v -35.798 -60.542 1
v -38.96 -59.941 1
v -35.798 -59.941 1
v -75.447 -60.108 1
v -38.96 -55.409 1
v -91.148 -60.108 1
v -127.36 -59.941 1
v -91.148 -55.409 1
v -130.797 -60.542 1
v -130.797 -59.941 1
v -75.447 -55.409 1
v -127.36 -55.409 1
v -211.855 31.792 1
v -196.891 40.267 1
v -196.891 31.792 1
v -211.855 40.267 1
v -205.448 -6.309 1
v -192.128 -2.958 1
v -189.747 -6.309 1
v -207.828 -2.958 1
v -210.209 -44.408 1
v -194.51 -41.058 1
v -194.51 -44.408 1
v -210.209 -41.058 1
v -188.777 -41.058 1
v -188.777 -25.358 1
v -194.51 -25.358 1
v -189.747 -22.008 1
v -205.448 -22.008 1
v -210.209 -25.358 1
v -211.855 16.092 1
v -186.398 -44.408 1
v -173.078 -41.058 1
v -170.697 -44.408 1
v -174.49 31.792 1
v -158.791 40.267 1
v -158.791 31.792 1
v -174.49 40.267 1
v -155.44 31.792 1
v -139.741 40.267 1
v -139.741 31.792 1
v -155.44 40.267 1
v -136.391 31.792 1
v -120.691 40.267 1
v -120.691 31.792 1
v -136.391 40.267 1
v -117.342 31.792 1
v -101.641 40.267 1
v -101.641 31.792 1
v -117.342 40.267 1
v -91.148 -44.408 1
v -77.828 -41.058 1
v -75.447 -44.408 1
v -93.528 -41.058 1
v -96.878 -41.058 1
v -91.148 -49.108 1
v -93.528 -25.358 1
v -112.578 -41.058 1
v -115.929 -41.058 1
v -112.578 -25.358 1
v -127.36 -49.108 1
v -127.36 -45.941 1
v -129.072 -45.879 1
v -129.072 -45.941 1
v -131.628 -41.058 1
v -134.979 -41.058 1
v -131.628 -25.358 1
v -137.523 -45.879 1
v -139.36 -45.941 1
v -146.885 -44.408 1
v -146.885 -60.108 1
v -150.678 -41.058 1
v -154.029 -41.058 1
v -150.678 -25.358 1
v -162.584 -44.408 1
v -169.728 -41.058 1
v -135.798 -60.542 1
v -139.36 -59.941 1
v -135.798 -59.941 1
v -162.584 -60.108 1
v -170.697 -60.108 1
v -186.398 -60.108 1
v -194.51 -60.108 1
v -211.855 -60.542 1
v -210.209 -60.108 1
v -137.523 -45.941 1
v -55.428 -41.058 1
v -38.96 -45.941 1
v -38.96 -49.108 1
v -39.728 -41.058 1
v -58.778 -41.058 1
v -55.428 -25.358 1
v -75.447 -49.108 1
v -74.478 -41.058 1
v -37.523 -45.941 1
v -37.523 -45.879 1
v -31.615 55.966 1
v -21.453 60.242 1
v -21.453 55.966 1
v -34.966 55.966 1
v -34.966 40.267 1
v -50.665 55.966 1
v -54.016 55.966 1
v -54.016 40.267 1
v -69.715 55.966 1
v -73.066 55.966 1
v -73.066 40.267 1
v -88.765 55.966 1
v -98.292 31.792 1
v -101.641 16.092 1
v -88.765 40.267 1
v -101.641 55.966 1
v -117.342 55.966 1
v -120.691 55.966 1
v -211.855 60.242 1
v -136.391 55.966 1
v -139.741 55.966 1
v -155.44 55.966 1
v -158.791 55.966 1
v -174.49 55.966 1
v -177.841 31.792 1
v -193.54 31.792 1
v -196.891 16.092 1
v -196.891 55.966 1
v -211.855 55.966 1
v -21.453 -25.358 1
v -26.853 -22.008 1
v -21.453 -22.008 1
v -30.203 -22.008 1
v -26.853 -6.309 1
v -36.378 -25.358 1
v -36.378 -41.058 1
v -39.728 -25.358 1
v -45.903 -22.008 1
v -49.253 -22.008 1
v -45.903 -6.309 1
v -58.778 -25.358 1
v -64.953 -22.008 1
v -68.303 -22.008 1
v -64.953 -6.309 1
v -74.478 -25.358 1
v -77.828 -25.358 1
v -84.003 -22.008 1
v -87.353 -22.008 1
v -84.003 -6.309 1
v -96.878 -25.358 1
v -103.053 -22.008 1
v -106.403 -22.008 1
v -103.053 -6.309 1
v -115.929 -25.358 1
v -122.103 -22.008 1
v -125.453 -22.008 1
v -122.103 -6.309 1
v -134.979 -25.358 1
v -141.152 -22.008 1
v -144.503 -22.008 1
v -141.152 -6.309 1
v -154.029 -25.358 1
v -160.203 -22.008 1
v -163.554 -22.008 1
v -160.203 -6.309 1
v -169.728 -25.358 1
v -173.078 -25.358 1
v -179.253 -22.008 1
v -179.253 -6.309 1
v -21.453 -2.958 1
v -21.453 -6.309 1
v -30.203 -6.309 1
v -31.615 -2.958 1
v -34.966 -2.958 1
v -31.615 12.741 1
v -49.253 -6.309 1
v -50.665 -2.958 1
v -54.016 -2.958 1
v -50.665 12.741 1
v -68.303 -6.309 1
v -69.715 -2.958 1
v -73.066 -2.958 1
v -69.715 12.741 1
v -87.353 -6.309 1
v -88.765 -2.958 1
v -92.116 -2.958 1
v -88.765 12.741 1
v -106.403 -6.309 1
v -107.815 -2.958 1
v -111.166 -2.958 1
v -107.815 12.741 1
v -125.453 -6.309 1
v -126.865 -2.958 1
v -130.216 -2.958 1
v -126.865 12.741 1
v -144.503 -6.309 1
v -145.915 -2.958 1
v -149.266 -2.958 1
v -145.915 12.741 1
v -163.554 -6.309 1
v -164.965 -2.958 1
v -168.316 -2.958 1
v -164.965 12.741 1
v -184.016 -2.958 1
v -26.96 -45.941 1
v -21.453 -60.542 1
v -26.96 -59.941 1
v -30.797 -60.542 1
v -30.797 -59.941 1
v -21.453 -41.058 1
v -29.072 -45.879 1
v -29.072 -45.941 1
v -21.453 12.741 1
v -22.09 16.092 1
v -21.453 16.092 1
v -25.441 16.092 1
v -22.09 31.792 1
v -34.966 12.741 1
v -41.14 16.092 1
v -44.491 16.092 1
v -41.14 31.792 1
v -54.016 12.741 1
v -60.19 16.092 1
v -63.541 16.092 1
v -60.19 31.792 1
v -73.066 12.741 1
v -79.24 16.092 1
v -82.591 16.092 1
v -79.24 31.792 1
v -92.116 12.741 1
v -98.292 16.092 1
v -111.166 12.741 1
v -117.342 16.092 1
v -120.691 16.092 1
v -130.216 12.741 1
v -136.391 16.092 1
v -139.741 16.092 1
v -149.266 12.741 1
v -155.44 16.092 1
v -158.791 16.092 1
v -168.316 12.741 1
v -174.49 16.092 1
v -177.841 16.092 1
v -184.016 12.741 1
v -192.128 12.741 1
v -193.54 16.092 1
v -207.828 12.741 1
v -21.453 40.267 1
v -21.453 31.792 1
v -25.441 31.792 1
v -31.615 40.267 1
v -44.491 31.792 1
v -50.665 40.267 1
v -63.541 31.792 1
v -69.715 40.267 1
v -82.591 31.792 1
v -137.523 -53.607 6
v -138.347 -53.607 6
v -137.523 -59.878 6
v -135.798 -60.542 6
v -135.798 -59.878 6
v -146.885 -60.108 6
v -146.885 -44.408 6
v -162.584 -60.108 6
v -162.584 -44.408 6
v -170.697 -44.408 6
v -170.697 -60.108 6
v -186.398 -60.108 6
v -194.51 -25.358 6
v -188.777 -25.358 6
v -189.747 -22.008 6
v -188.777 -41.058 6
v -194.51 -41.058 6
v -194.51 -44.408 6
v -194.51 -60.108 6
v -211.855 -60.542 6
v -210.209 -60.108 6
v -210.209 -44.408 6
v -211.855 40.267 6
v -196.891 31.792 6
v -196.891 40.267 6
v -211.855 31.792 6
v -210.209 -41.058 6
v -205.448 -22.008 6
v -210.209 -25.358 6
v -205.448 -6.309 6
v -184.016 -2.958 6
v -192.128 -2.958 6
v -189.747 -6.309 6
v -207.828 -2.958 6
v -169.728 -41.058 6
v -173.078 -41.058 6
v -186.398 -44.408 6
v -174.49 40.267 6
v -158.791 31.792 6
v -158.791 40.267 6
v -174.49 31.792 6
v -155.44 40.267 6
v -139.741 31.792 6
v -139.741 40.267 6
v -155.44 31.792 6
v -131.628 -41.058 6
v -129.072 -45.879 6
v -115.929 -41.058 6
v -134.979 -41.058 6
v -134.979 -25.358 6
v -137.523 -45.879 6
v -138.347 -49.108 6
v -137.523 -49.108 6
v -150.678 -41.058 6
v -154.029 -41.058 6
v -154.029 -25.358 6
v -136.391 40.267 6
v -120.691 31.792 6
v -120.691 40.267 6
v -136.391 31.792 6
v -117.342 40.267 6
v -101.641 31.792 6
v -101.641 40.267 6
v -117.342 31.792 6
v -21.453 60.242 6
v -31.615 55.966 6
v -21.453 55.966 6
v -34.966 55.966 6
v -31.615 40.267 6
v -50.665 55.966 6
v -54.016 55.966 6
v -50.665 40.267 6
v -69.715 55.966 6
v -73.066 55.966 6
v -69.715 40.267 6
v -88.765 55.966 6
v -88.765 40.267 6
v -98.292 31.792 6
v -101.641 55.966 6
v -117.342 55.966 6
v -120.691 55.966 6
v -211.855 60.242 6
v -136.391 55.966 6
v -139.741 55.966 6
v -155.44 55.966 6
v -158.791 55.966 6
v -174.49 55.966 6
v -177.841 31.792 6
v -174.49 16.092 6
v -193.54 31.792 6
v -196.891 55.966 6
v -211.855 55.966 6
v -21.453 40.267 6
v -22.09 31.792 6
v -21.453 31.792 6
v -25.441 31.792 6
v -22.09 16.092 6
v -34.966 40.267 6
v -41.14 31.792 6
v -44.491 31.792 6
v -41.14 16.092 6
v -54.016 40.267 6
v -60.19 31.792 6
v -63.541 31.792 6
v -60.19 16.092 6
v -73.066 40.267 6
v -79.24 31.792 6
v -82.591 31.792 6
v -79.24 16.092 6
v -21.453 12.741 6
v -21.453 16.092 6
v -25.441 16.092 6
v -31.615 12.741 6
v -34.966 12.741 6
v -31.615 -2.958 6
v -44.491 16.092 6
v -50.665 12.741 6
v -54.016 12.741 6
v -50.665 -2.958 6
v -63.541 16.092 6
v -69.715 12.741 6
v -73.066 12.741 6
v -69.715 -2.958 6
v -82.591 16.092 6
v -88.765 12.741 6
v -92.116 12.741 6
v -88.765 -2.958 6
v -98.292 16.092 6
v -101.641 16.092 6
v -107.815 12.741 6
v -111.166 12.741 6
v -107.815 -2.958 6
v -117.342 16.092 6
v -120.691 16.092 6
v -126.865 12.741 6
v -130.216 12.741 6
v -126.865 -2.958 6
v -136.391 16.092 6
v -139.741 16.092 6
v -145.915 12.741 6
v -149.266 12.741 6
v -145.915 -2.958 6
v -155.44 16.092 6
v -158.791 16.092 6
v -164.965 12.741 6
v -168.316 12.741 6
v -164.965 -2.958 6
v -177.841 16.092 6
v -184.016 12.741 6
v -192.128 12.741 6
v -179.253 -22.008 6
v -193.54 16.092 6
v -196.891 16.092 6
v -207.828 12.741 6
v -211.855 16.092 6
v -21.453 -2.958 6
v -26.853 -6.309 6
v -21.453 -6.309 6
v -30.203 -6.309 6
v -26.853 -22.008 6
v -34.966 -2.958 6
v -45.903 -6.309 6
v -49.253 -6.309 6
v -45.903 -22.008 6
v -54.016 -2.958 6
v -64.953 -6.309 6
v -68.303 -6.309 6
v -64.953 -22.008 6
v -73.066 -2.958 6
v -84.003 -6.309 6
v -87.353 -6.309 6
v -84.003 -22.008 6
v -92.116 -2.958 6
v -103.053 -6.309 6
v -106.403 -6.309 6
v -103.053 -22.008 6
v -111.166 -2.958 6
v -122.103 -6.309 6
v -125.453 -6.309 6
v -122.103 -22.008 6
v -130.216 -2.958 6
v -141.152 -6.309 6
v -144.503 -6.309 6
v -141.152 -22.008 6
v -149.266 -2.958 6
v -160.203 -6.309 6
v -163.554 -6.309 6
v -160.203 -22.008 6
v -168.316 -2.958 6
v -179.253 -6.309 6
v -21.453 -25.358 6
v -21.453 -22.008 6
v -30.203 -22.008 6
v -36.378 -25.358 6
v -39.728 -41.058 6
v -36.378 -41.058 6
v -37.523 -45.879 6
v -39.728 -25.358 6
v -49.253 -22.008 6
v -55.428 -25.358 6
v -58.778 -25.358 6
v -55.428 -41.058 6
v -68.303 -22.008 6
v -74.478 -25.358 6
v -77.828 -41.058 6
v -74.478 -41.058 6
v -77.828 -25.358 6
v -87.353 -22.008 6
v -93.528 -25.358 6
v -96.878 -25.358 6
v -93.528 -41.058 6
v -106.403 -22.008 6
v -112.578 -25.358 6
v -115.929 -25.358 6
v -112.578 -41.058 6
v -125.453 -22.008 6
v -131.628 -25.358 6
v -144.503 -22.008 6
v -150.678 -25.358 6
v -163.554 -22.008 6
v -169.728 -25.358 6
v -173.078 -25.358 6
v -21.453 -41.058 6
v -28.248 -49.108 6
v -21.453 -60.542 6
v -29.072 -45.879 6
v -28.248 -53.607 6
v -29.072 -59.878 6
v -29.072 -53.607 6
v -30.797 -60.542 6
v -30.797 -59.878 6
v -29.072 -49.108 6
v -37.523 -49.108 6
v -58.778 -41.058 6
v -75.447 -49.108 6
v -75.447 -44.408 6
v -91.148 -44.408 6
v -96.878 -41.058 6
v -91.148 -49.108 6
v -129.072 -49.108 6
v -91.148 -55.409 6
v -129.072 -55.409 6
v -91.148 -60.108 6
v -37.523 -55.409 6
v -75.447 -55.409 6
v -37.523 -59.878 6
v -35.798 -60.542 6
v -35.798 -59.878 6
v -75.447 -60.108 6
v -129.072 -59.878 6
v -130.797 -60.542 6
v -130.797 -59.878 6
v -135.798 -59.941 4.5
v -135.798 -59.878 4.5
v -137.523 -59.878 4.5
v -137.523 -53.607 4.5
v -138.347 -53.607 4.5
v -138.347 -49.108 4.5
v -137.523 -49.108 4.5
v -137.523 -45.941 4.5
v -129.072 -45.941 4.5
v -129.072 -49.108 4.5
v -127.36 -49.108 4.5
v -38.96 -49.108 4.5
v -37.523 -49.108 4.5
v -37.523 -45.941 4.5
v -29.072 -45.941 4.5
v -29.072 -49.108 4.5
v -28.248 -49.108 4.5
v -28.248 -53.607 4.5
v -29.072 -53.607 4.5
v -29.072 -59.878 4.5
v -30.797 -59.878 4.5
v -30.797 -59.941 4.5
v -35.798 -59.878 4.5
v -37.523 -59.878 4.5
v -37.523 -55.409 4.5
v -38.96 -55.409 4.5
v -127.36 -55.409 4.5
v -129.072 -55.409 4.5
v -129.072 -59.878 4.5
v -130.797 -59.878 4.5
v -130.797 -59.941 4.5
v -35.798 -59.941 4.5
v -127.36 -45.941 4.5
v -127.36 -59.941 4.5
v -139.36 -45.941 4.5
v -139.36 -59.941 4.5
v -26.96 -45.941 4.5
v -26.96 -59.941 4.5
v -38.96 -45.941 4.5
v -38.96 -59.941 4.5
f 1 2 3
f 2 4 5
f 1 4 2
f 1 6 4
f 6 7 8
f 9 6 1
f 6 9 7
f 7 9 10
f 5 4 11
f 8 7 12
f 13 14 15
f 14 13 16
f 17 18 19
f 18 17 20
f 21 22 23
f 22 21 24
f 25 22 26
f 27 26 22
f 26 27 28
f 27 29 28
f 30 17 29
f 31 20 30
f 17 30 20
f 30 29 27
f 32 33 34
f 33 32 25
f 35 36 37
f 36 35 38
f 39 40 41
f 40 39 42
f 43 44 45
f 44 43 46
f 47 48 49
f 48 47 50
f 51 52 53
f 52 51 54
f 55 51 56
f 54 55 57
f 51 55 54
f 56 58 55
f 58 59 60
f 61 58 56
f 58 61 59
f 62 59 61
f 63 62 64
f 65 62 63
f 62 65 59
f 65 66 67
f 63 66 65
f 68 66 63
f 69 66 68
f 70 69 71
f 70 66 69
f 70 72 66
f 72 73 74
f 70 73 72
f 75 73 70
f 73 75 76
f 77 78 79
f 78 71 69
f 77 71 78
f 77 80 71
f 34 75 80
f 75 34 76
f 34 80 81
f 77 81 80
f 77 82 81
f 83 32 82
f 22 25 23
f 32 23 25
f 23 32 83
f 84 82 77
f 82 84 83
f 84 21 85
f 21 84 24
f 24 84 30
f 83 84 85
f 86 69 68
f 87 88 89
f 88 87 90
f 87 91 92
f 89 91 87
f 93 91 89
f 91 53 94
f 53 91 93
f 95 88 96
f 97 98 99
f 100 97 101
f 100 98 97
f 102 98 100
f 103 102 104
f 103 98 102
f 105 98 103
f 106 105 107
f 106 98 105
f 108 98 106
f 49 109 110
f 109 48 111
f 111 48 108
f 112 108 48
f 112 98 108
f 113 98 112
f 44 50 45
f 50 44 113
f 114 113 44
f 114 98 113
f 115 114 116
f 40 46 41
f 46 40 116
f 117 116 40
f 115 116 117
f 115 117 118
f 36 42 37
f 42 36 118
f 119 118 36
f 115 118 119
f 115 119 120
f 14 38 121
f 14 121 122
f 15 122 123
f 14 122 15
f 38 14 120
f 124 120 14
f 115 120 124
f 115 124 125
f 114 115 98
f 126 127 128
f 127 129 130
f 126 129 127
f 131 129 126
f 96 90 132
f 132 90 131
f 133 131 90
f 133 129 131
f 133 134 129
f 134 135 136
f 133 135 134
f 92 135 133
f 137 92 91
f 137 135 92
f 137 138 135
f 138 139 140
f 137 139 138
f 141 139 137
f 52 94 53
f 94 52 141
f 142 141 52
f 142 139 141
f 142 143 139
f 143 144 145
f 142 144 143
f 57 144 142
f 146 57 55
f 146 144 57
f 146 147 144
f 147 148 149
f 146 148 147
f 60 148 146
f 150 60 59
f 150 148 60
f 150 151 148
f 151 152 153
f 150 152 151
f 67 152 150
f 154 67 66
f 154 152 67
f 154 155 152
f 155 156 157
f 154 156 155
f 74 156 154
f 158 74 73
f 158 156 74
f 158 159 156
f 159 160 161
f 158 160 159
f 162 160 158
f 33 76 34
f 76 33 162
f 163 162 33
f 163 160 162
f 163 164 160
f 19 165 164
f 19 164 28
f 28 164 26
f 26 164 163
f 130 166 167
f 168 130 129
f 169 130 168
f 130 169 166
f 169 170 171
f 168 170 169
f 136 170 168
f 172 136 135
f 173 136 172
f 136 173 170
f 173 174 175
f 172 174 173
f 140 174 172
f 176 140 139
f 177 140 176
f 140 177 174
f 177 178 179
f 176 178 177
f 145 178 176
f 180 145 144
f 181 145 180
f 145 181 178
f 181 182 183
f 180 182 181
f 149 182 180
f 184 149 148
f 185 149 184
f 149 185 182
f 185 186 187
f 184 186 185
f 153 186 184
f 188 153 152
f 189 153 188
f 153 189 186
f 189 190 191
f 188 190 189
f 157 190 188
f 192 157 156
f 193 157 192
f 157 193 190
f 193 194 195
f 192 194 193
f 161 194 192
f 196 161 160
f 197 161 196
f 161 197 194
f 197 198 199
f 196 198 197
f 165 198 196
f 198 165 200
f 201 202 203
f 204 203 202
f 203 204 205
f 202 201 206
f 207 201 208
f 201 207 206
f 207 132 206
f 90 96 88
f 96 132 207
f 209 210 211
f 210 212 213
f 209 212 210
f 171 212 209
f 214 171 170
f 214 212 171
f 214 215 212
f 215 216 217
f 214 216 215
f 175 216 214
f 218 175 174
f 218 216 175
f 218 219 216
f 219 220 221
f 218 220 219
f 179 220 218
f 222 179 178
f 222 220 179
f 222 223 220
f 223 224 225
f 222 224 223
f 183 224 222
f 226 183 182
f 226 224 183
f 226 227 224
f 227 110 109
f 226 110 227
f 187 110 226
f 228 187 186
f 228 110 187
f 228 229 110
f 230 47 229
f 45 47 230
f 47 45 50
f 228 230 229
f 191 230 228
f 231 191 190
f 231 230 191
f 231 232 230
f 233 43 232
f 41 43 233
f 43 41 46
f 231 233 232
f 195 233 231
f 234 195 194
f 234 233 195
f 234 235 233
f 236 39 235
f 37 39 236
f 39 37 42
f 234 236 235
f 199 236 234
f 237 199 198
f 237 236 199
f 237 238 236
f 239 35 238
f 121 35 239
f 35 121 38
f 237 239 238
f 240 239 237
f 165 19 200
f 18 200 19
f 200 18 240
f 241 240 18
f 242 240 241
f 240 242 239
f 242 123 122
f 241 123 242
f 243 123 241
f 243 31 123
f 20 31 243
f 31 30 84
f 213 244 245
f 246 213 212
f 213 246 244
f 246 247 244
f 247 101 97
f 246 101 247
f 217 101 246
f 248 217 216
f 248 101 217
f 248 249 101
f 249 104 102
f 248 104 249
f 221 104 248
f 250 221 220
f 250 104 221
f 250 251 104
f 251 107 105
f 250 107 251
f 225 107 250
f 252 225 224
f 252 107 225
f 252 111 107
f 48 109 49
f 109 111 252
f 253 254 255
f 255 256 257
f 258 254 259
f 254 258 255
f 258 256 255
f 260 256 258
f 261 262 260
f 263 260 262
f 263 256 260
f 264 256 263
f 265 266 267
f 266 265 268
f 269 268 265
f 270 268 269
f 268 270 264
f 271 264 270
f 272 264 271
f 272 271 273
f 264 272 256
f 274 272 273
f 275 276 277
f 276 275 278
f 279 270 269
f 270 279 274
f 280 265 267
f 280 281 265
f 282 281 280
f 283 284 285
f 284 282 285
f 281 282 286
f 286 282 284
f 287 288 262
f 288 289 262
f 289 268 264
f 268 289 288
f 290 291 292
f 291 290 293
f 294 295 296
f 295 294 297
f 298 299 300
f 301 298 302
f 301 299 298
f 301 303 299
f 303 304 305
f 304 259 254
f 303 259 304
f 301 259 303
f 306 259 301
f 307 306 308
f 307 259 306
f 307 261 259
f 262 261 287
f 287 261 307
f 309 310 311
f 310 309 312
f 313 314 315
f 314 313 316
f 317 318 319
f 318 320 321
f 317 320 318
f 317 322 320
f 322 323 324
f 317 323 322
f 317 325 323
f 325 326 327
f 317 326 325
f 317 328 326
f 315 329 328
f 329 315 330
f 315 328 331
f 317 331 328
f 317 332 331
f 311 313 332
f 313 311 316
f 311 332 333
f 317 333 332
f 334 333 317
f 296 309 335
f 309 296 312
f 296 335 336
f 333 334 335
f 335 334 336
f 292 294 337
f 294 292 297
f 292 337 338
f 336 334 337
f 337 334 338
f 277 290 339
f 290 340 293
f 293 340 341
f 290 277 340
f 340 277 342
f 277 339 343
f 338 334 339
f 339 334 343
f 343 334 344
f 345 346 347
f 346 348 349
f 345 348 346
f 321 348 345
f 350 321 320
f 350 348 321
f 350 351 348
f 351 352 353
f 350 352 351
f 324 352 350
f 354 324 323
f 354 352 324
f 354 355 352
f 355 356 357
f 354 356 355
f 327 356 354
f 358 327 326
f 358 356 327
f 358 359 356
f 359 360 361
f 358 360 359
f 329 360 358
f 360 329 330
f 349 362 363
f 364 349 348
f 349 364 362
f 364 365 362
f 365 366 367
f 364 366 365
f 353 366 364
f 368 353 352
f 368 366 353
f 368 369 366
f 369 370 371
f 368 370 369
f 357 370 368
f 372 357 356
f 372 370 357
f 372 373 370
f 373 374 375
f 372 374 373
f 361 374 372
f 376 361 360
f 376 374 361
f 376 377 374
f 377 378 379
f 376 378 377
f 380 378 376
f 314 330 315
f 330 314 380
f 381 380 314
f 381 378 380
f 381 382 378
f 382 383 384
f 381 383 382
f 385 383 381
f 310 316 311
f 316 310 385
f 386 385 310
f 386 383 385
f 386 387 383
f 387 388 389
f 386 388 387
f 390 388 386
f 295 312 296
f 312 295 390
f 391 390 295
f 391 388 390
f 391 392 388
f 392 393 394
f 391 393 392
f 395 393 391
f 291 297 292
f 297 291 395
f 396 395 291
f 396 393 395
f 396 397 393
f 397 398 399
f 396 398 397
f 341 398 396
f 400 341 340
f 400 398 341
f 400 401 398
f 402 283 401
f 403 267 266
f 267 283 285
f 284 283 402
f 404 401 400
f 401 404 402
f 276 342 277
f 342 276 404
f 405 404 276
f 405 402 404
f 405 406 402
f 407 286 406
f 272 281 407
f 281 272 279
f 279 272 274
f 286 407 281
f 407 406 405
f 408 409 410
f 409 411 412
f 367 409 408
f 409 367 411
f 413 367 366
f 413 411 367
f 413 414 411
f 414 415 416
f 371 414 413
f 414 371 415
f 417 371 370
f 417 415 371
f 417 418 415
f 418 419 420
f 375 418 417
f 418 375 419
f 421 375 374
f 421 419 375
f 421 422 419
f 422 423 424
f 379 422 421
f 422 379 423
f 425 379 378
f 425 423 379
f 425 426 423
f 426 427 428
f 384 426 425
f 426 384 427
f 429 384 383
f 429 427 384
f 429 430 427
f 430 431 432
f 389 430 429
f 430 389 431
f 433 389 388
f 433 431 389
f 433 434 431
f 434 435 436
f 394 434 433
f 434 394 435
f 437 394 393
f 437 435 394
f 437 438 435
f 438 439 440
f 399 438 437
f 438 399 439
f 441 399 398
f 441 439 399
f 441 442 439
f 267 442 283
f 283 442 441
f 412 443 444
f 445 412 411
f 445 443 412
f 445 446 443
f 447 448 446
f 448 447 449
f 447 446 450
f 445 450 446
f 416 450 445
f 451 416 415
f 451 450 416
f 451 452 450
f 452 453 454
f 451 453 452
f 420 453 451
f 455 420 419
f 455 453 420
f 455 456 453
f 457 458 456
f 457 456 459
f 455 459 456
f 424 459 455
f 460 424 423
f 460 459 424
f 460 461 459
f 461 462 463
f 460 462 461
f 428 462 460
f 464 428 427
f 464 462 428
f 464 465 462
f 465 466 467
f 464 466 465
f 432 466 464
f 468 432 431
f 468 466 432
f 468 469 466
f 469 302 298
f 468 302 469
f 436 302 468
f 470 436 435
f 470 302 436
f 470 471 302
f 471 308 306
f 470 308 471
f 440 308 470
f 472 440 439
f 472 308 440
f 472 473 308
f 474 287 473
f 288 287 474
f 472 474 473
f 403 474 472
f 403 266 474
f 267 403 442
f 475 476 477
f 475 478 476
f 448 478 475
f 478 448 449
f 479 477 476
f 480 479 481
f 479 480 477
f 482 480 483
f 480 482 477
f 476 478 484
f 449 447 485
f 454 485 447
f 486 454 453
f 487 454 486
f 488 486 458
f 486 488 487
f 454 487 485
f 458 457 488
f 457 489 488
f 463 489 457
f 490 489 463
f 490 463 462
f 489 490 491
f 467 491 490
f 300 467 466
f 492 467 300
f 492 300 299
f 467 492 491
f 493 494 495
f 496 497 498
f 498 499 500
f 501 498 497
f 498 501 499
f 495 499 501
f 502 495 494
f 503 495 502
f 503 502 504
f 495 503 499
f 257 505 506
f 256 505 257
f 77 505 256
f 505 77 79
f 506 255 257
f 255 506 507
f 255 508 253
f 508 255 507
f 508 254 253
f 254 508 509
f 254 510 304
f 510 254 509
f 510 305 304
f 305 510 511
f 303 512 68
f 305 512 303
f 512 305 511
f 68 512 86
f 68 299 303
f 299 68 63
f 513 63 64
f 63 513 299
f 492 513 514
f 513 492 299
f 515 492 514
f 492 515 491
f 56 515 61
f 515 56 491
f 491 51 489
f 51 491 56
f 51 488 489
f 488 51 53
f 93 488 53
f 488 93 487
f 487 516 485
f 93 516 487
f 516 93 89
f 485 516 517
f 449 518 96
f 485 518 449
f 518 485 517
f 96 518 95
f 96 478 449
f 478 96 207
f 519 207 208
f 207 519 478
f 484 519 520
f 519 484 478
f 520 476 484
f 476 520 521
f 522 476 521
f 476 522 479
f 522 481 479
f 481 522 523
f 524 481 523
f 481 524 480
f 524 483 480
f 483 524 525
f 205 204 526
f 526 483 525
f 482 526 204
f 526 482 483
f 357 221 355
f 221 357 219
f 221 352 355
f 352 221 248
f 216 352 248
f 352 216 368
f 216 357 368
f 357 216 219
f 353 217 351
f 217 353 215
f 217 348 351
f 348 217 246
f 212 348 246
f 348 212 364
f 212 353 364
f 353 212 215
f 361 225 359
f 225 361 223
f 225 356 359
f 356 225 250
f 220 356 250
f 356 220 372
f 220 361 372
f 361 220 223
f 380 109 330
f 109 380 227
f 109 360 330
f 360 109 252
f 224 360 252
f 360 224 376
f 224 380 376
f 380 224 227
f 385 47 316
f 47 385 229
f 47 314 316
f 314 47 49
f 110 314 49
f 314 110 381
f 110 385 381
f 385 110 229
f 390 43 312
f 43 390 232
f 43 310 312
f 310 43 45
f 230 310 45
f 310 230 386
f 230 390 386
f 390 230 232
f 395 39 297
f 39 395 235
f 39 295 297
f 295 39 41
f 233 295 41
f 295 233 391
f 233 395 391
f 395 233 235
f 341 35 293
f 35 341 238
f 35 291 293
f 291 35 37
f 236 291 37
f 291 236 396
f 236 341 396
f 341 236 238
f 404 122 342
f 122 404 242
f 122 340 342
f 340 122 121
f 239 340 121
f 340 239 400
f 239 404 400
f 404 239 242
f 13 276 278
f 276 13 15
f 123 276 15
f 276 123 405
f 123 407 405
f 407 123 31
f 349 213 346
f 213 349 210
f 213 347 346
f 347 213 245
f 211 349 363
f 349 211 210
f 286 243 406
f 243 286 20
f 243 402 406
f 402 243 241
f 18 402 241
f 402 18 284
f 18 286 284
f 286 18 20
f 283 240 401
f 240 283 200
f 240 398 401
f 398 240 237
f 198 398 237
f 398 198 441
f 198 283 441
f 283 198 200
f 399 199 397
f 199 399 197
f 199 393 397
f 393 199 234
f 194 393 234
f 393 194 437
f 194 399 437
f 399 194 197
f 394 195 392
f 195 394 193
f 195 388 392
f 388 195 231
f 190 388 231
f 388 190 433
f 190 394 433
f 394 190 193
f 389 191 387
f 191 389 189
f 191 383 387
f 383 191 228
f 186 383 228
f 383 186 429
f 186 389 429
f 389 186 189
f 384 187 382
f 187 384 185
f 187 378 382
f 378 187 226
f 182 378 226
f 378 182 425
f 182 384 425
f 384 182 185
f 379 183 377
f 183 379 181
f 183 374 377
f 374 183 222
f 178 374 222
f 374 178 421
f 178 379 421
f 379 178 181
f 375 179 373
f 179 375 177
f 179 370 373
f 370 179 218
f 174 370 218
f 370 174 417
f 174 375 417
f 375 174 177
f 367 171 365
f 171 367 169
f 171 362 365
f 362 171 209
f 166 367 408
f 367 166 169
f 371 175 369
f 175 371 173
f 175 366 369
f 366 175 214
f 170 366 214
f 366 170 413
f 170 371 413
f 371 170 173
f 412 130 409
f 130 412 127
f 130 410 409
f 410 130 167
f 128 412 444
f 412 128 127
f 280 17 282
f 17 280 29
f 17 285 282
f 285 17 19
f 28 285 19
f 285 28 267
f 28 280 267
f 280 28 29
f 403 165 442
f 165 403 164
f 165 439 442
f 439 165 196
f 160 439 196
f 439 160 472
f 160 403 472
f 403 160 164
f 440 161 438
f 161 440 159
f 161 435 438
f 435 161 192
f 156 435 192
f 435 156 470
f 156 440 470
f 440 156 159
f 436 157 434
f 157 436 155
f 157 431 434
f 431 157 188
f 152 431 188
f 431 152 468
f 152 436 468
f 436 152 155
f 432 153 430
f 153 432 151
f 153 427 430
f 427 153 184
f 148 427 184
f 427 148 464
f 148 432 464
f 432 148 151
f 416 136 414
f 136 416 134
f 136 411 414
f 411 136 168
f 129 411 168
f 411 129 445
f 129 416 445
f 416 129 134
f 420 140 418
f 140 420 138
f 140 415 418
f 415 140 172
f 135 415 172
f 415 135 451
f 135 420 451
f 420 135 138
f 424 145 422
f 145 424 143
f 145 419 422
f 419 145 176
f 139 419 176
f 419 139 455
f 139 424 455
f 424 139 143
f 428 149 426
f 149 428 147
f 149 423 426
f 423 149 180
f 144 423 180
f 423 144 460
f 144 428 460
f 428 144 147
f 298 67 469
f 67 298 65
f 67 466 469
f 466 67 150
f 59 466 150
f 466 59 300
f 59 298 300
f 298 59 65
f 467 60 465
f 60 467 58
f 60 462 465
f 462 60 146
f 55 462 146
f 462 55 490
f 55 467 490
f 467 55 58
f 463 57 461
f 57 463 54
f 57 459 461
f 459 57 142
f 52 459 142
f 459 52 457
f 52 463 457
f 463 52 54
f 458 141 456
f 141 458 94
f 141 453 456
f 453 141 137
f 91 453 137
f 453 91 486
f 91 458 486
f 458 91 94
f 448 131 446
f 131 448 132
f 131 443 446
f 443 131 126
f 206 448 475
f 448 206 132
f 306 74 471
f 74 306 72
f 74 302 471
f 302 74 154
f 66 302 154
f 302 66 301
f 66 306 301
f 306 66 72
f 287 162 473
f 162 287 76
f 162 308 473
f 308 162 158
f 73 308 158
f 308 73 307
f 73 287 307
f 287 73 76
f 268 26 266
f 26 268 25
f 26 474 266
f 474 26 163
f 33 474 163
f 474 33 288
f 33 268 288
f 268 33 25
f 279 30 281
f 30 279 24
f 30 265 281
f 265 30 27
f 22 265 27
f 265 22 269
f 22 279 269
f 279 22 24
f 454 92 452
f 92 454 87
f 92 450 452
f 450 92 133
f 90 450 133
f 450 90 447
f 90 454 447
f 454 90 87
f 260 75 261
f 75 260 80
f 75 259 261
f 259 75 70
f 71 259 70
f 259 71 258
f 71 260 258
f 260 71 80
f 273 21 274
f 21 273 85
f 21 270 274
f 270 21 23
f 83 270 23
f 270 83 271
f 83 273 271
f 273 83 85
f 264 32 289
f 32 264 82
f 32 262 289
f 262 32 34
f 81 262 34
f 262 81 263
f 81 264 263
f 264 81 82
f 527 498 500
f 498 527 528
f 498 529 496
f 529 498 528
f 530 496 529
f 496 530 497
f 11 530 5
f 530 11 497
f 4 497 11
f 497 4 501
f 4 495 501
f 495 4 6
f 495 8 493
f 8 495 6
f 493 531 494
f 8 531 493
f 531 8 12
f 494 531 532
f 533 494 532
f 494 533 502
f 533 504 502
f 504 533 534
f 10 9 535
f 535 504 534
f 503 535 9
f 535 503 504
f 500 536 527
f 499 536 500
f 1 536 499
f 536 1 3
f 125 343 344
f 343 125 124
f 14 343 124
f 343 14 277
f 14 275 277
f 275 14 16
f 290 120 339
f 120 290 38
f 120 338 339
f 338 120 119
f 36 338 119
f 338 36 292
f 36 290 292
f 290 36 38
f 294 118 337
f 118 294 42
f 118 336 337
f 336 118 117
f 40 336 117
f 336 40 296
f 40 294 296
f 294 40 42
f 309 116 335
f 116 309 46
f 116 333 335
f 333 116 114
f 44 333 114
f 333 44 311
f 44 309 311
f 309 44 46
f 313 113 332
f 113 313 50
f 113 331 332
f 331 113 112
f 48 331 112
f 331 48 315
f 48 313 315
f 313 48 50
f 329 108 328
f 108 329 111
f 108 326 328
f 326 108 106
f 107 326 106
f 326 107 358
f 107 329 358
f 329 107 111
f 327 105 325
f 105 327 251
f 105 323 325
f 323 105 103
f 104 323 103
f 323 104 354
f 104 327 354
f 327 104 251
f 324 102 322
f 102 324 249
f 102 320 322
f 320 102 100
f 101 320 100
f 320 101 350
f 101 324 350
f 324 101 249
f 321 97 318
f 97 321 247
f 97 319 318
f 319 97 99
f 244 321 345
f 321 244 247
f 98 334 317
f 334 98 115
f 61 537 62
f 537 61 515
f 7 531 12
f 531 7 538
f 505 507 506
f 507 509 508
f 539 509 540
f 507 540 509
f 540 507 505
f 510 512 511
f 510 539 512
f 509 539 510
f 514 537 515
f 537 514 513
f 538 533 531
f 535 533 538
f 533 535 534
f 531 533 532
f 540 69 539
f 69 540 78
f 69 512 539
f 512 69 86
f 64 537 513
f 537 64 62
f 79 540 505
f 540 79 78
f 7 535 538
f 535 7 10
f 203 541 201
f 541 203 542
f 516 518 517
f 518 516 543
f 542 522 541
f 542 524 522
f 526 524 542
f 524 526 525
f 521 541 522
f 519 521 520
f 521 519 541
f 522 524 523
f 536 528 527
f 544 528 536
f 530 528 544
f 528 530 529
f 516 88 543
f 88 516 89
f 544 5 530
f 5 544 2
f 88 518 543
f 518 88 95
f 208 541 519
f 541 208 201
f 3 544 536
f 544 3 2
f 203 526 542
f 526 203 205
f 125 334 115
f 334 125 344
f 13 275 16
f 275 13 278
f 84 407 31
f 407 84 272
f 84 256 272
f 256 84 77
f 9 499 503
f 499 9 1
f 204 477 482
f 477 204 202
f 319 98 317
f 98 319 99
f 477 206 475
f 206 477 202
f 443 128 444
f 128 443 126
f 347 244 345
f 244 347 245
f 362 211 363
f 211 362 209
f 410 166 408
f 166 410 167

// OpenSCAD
// All measurements in mm

// inner_case_length = 421;
// inner_case_width = 121;
// inner_case_height = 15;

plate_length = 428.72;
plate_width = 124.083;
plate_height = 5;

offset_delta = -0.85;

// module screw_mount(x, y)
// {
//   translate([ -(inner_case_length / 2) + x, -(inner_case_width / 2) + y, 0 ])
//   {
//     $fn = 50;
//     difference()
//     {
//       translate([ 0, 0, -0.85 ])
//       {
//         cylinder(h = inner_case_height - 4, r = 2, center = true);
//       }
//       translate([ 0, 0, inner_case_height / 4 ])
//       {
//         cylinder(h = inner_case_height / 2, r = 1, center = true);
//       }
//     }
//     translate([ 0, 0, -(inner_case_height / 2) + 3 ])
//     {
//       cube([ 10, 2, 4 ], center = true);
//       cube([ 2, 10, 4 ], center = true);
//     }
//   }
// }

module replace_plate_cutout(x, y, w, h)
{
  translate([- (plate_length / 2), - (plate_width / 2), 1])
  {
    translate([x, y, -18.5])
    cube([ w, h, 22 ], center = false);
  }
}

module replace_plate_part(x, y, w, h)
{
  translate([- (plate_length / 2), - (plate_width / 2), 4.5])
  {
    difference()
    {
      linear_extrude(height = 1.5, center = false, convexity = 10)
        import (file = "src/plate_layout_mk2.dxf");
        

      difference()
      {
        translate([-1, -1, -1])
        cube([ plate_length + 2, plate_width + 2, 20 ], center = false);

        translate([x, y, -2])
        cube([ w, h, 22 ], center = false);
      }
    }
  }
}

// Top left to bottom right
stabilizer_cutouts = [
  // #1 Backspace, horizontal
  [248.5, 77.15, 36, 15.063],

  // #2 Enter, vertical
  [plate_length - 75.15, 1.1, 36, 15.063],

  // #3 RShift, horizontal
  [241.6, 20, 36, 15.063],

  // #4 Numpad 0, horizontal
  [plate_length - 75.15, 1.1, 36, 15.063],

  // #5 Numpad +, vertical
  [plate_length - 20, 40.45, 16.9, 34],

  // #6 Numpad enter, vertical
  [plate_length - 20, 2.3, 16.9, 34],

  // Spacebar
  [75, 2.1, 12, 14],
  [175.4, 2.1, 12, 14],
];

stabilizers = [
  // #1 Backspace, horizontal
  [249.75, 77.15, 9.21, 16.9],
  [249.75 + 24.9, 77.15, 9.21, 16.9],

  // #2 Enter, vertical
  [plate_length - 74.2, 1.1, 9.21, 16.9],
  [plate_length - 49.3, 1.1, 9.21, 16.9],

  // #3 RShift, horizontal
  [242.6, 20, 9.21, 16.9],
  [242.6 + 24.9, 20, 9.21, 16.9],

  // #4 Numpad 0, horizontal
  [plate_length - 74.2, 1.1, 9.21, 16.9],
  [plate_length - 49.3, 1.1, 9.21, 16.9],

  // #5 Numpad +, vertical
  [plate_length - 20, 40.45, 16.9, 9.21],
  [plate_length - 20, 65.2, 16.9, 9.21],

  // #6 Numpad enter, vertical
  [plate_length - 20, 2.3, 16.9, 9.21],
  [plate_length - 20, 27.1, 16.9, 9.21],

  // Spacebar
  [plate_length - 74.2, 1.1, 9.21, 16.9],
  [plate_length - 49.3, 1.1, 9.21, 16.9],
];

module cutoff_far_left()
{
  translate([ - (plate_length / 3) * 2 + 1.5, 0, 0 ])
  {
    cube([ plate_length / 3 + 2.01, plate_width + 4, 20 ],
         center = true);
  }
}

module cutoff_bottom()
{
  translate([ 0, - plate_width - 0.5, 0 ])
  {
    cube([ plate_length + 2, plate_width + 4, 20 ],
         center = true);
  }
}

module keyboard_plate()
{
  difference()
  {
    translate([- (plate_length / 2), - (plate_width / 2), 1])
    {
      translate([0, plate_width - 5.3, 0])
      {
        cube([ plate_length, 3.5, plate_height ], center = false);
      }
      difference()
      {
        linear_extrude(height = plate_height, center = false, convexity = 10)
          offset(delta = offset_delta) {  
            import (file = "src/plate_layout_mk2.dxf");
          }

        translate([ -1, plate_width / 2 + 35, -1 ])
        cube([ plate_length + 2, plate_width, 20 ], center = false);
      }
      difference()
      {
        translate([ 0, -4.4, 0 ])
        linear_extrude(height = plate_height, center = false, convexity = 10)
          offset(delta = offset_delta) {  
            import (file = "src/plate_layout_mk2.dxf");
          }

        translate([ -1, -27.1, -1 ])
        cube([ plate_length + 2, plate_width, 20 ], center = false);
      }
    }

    for (i=[0:(len(stabilizer_cutouts)-1)]) {
      stab_values = stabilizer_cutouts[i];
      replace_plate_cutout(stab_values[0], stab_values[1], stab_values[2], stab_values[3]);
    }

    cutoff_far_left();
    cutoff_bottom();
  }

  for (i=[0:(len(stabilizers)-1)]) {
    stab_values = stabilizers[i];
    replace_plate_part(stab_values[0], stab_values[1], stab_values[2], stab_values[3]);
  }
}

module cutout_center()
{
  translate([ 50, 0, 0 ])
  {
    cube([ plate_length / 3, plate_width + 4, 20 ], center = true);
  }
}

module cutout_left()
{
  translate([ - (plate_length / 3) - 1, 0, 0 ])
  {
    cube([ plate_length / 3 + 2.01, plate_width + 4, 20 ],
         center = true);
  }
}

module cutout_right()
{
  translate([ (plate_length / 3) + 1, 0, 0 ])
  {
    cube([ plate_length / 3 + 2.01, plate_width + 4, 20 ],
         center = true);
  }
}

difference()
{
  keyboard_plate();
  // cutout_left();
  cutout_center();
  cutout_right();
}
